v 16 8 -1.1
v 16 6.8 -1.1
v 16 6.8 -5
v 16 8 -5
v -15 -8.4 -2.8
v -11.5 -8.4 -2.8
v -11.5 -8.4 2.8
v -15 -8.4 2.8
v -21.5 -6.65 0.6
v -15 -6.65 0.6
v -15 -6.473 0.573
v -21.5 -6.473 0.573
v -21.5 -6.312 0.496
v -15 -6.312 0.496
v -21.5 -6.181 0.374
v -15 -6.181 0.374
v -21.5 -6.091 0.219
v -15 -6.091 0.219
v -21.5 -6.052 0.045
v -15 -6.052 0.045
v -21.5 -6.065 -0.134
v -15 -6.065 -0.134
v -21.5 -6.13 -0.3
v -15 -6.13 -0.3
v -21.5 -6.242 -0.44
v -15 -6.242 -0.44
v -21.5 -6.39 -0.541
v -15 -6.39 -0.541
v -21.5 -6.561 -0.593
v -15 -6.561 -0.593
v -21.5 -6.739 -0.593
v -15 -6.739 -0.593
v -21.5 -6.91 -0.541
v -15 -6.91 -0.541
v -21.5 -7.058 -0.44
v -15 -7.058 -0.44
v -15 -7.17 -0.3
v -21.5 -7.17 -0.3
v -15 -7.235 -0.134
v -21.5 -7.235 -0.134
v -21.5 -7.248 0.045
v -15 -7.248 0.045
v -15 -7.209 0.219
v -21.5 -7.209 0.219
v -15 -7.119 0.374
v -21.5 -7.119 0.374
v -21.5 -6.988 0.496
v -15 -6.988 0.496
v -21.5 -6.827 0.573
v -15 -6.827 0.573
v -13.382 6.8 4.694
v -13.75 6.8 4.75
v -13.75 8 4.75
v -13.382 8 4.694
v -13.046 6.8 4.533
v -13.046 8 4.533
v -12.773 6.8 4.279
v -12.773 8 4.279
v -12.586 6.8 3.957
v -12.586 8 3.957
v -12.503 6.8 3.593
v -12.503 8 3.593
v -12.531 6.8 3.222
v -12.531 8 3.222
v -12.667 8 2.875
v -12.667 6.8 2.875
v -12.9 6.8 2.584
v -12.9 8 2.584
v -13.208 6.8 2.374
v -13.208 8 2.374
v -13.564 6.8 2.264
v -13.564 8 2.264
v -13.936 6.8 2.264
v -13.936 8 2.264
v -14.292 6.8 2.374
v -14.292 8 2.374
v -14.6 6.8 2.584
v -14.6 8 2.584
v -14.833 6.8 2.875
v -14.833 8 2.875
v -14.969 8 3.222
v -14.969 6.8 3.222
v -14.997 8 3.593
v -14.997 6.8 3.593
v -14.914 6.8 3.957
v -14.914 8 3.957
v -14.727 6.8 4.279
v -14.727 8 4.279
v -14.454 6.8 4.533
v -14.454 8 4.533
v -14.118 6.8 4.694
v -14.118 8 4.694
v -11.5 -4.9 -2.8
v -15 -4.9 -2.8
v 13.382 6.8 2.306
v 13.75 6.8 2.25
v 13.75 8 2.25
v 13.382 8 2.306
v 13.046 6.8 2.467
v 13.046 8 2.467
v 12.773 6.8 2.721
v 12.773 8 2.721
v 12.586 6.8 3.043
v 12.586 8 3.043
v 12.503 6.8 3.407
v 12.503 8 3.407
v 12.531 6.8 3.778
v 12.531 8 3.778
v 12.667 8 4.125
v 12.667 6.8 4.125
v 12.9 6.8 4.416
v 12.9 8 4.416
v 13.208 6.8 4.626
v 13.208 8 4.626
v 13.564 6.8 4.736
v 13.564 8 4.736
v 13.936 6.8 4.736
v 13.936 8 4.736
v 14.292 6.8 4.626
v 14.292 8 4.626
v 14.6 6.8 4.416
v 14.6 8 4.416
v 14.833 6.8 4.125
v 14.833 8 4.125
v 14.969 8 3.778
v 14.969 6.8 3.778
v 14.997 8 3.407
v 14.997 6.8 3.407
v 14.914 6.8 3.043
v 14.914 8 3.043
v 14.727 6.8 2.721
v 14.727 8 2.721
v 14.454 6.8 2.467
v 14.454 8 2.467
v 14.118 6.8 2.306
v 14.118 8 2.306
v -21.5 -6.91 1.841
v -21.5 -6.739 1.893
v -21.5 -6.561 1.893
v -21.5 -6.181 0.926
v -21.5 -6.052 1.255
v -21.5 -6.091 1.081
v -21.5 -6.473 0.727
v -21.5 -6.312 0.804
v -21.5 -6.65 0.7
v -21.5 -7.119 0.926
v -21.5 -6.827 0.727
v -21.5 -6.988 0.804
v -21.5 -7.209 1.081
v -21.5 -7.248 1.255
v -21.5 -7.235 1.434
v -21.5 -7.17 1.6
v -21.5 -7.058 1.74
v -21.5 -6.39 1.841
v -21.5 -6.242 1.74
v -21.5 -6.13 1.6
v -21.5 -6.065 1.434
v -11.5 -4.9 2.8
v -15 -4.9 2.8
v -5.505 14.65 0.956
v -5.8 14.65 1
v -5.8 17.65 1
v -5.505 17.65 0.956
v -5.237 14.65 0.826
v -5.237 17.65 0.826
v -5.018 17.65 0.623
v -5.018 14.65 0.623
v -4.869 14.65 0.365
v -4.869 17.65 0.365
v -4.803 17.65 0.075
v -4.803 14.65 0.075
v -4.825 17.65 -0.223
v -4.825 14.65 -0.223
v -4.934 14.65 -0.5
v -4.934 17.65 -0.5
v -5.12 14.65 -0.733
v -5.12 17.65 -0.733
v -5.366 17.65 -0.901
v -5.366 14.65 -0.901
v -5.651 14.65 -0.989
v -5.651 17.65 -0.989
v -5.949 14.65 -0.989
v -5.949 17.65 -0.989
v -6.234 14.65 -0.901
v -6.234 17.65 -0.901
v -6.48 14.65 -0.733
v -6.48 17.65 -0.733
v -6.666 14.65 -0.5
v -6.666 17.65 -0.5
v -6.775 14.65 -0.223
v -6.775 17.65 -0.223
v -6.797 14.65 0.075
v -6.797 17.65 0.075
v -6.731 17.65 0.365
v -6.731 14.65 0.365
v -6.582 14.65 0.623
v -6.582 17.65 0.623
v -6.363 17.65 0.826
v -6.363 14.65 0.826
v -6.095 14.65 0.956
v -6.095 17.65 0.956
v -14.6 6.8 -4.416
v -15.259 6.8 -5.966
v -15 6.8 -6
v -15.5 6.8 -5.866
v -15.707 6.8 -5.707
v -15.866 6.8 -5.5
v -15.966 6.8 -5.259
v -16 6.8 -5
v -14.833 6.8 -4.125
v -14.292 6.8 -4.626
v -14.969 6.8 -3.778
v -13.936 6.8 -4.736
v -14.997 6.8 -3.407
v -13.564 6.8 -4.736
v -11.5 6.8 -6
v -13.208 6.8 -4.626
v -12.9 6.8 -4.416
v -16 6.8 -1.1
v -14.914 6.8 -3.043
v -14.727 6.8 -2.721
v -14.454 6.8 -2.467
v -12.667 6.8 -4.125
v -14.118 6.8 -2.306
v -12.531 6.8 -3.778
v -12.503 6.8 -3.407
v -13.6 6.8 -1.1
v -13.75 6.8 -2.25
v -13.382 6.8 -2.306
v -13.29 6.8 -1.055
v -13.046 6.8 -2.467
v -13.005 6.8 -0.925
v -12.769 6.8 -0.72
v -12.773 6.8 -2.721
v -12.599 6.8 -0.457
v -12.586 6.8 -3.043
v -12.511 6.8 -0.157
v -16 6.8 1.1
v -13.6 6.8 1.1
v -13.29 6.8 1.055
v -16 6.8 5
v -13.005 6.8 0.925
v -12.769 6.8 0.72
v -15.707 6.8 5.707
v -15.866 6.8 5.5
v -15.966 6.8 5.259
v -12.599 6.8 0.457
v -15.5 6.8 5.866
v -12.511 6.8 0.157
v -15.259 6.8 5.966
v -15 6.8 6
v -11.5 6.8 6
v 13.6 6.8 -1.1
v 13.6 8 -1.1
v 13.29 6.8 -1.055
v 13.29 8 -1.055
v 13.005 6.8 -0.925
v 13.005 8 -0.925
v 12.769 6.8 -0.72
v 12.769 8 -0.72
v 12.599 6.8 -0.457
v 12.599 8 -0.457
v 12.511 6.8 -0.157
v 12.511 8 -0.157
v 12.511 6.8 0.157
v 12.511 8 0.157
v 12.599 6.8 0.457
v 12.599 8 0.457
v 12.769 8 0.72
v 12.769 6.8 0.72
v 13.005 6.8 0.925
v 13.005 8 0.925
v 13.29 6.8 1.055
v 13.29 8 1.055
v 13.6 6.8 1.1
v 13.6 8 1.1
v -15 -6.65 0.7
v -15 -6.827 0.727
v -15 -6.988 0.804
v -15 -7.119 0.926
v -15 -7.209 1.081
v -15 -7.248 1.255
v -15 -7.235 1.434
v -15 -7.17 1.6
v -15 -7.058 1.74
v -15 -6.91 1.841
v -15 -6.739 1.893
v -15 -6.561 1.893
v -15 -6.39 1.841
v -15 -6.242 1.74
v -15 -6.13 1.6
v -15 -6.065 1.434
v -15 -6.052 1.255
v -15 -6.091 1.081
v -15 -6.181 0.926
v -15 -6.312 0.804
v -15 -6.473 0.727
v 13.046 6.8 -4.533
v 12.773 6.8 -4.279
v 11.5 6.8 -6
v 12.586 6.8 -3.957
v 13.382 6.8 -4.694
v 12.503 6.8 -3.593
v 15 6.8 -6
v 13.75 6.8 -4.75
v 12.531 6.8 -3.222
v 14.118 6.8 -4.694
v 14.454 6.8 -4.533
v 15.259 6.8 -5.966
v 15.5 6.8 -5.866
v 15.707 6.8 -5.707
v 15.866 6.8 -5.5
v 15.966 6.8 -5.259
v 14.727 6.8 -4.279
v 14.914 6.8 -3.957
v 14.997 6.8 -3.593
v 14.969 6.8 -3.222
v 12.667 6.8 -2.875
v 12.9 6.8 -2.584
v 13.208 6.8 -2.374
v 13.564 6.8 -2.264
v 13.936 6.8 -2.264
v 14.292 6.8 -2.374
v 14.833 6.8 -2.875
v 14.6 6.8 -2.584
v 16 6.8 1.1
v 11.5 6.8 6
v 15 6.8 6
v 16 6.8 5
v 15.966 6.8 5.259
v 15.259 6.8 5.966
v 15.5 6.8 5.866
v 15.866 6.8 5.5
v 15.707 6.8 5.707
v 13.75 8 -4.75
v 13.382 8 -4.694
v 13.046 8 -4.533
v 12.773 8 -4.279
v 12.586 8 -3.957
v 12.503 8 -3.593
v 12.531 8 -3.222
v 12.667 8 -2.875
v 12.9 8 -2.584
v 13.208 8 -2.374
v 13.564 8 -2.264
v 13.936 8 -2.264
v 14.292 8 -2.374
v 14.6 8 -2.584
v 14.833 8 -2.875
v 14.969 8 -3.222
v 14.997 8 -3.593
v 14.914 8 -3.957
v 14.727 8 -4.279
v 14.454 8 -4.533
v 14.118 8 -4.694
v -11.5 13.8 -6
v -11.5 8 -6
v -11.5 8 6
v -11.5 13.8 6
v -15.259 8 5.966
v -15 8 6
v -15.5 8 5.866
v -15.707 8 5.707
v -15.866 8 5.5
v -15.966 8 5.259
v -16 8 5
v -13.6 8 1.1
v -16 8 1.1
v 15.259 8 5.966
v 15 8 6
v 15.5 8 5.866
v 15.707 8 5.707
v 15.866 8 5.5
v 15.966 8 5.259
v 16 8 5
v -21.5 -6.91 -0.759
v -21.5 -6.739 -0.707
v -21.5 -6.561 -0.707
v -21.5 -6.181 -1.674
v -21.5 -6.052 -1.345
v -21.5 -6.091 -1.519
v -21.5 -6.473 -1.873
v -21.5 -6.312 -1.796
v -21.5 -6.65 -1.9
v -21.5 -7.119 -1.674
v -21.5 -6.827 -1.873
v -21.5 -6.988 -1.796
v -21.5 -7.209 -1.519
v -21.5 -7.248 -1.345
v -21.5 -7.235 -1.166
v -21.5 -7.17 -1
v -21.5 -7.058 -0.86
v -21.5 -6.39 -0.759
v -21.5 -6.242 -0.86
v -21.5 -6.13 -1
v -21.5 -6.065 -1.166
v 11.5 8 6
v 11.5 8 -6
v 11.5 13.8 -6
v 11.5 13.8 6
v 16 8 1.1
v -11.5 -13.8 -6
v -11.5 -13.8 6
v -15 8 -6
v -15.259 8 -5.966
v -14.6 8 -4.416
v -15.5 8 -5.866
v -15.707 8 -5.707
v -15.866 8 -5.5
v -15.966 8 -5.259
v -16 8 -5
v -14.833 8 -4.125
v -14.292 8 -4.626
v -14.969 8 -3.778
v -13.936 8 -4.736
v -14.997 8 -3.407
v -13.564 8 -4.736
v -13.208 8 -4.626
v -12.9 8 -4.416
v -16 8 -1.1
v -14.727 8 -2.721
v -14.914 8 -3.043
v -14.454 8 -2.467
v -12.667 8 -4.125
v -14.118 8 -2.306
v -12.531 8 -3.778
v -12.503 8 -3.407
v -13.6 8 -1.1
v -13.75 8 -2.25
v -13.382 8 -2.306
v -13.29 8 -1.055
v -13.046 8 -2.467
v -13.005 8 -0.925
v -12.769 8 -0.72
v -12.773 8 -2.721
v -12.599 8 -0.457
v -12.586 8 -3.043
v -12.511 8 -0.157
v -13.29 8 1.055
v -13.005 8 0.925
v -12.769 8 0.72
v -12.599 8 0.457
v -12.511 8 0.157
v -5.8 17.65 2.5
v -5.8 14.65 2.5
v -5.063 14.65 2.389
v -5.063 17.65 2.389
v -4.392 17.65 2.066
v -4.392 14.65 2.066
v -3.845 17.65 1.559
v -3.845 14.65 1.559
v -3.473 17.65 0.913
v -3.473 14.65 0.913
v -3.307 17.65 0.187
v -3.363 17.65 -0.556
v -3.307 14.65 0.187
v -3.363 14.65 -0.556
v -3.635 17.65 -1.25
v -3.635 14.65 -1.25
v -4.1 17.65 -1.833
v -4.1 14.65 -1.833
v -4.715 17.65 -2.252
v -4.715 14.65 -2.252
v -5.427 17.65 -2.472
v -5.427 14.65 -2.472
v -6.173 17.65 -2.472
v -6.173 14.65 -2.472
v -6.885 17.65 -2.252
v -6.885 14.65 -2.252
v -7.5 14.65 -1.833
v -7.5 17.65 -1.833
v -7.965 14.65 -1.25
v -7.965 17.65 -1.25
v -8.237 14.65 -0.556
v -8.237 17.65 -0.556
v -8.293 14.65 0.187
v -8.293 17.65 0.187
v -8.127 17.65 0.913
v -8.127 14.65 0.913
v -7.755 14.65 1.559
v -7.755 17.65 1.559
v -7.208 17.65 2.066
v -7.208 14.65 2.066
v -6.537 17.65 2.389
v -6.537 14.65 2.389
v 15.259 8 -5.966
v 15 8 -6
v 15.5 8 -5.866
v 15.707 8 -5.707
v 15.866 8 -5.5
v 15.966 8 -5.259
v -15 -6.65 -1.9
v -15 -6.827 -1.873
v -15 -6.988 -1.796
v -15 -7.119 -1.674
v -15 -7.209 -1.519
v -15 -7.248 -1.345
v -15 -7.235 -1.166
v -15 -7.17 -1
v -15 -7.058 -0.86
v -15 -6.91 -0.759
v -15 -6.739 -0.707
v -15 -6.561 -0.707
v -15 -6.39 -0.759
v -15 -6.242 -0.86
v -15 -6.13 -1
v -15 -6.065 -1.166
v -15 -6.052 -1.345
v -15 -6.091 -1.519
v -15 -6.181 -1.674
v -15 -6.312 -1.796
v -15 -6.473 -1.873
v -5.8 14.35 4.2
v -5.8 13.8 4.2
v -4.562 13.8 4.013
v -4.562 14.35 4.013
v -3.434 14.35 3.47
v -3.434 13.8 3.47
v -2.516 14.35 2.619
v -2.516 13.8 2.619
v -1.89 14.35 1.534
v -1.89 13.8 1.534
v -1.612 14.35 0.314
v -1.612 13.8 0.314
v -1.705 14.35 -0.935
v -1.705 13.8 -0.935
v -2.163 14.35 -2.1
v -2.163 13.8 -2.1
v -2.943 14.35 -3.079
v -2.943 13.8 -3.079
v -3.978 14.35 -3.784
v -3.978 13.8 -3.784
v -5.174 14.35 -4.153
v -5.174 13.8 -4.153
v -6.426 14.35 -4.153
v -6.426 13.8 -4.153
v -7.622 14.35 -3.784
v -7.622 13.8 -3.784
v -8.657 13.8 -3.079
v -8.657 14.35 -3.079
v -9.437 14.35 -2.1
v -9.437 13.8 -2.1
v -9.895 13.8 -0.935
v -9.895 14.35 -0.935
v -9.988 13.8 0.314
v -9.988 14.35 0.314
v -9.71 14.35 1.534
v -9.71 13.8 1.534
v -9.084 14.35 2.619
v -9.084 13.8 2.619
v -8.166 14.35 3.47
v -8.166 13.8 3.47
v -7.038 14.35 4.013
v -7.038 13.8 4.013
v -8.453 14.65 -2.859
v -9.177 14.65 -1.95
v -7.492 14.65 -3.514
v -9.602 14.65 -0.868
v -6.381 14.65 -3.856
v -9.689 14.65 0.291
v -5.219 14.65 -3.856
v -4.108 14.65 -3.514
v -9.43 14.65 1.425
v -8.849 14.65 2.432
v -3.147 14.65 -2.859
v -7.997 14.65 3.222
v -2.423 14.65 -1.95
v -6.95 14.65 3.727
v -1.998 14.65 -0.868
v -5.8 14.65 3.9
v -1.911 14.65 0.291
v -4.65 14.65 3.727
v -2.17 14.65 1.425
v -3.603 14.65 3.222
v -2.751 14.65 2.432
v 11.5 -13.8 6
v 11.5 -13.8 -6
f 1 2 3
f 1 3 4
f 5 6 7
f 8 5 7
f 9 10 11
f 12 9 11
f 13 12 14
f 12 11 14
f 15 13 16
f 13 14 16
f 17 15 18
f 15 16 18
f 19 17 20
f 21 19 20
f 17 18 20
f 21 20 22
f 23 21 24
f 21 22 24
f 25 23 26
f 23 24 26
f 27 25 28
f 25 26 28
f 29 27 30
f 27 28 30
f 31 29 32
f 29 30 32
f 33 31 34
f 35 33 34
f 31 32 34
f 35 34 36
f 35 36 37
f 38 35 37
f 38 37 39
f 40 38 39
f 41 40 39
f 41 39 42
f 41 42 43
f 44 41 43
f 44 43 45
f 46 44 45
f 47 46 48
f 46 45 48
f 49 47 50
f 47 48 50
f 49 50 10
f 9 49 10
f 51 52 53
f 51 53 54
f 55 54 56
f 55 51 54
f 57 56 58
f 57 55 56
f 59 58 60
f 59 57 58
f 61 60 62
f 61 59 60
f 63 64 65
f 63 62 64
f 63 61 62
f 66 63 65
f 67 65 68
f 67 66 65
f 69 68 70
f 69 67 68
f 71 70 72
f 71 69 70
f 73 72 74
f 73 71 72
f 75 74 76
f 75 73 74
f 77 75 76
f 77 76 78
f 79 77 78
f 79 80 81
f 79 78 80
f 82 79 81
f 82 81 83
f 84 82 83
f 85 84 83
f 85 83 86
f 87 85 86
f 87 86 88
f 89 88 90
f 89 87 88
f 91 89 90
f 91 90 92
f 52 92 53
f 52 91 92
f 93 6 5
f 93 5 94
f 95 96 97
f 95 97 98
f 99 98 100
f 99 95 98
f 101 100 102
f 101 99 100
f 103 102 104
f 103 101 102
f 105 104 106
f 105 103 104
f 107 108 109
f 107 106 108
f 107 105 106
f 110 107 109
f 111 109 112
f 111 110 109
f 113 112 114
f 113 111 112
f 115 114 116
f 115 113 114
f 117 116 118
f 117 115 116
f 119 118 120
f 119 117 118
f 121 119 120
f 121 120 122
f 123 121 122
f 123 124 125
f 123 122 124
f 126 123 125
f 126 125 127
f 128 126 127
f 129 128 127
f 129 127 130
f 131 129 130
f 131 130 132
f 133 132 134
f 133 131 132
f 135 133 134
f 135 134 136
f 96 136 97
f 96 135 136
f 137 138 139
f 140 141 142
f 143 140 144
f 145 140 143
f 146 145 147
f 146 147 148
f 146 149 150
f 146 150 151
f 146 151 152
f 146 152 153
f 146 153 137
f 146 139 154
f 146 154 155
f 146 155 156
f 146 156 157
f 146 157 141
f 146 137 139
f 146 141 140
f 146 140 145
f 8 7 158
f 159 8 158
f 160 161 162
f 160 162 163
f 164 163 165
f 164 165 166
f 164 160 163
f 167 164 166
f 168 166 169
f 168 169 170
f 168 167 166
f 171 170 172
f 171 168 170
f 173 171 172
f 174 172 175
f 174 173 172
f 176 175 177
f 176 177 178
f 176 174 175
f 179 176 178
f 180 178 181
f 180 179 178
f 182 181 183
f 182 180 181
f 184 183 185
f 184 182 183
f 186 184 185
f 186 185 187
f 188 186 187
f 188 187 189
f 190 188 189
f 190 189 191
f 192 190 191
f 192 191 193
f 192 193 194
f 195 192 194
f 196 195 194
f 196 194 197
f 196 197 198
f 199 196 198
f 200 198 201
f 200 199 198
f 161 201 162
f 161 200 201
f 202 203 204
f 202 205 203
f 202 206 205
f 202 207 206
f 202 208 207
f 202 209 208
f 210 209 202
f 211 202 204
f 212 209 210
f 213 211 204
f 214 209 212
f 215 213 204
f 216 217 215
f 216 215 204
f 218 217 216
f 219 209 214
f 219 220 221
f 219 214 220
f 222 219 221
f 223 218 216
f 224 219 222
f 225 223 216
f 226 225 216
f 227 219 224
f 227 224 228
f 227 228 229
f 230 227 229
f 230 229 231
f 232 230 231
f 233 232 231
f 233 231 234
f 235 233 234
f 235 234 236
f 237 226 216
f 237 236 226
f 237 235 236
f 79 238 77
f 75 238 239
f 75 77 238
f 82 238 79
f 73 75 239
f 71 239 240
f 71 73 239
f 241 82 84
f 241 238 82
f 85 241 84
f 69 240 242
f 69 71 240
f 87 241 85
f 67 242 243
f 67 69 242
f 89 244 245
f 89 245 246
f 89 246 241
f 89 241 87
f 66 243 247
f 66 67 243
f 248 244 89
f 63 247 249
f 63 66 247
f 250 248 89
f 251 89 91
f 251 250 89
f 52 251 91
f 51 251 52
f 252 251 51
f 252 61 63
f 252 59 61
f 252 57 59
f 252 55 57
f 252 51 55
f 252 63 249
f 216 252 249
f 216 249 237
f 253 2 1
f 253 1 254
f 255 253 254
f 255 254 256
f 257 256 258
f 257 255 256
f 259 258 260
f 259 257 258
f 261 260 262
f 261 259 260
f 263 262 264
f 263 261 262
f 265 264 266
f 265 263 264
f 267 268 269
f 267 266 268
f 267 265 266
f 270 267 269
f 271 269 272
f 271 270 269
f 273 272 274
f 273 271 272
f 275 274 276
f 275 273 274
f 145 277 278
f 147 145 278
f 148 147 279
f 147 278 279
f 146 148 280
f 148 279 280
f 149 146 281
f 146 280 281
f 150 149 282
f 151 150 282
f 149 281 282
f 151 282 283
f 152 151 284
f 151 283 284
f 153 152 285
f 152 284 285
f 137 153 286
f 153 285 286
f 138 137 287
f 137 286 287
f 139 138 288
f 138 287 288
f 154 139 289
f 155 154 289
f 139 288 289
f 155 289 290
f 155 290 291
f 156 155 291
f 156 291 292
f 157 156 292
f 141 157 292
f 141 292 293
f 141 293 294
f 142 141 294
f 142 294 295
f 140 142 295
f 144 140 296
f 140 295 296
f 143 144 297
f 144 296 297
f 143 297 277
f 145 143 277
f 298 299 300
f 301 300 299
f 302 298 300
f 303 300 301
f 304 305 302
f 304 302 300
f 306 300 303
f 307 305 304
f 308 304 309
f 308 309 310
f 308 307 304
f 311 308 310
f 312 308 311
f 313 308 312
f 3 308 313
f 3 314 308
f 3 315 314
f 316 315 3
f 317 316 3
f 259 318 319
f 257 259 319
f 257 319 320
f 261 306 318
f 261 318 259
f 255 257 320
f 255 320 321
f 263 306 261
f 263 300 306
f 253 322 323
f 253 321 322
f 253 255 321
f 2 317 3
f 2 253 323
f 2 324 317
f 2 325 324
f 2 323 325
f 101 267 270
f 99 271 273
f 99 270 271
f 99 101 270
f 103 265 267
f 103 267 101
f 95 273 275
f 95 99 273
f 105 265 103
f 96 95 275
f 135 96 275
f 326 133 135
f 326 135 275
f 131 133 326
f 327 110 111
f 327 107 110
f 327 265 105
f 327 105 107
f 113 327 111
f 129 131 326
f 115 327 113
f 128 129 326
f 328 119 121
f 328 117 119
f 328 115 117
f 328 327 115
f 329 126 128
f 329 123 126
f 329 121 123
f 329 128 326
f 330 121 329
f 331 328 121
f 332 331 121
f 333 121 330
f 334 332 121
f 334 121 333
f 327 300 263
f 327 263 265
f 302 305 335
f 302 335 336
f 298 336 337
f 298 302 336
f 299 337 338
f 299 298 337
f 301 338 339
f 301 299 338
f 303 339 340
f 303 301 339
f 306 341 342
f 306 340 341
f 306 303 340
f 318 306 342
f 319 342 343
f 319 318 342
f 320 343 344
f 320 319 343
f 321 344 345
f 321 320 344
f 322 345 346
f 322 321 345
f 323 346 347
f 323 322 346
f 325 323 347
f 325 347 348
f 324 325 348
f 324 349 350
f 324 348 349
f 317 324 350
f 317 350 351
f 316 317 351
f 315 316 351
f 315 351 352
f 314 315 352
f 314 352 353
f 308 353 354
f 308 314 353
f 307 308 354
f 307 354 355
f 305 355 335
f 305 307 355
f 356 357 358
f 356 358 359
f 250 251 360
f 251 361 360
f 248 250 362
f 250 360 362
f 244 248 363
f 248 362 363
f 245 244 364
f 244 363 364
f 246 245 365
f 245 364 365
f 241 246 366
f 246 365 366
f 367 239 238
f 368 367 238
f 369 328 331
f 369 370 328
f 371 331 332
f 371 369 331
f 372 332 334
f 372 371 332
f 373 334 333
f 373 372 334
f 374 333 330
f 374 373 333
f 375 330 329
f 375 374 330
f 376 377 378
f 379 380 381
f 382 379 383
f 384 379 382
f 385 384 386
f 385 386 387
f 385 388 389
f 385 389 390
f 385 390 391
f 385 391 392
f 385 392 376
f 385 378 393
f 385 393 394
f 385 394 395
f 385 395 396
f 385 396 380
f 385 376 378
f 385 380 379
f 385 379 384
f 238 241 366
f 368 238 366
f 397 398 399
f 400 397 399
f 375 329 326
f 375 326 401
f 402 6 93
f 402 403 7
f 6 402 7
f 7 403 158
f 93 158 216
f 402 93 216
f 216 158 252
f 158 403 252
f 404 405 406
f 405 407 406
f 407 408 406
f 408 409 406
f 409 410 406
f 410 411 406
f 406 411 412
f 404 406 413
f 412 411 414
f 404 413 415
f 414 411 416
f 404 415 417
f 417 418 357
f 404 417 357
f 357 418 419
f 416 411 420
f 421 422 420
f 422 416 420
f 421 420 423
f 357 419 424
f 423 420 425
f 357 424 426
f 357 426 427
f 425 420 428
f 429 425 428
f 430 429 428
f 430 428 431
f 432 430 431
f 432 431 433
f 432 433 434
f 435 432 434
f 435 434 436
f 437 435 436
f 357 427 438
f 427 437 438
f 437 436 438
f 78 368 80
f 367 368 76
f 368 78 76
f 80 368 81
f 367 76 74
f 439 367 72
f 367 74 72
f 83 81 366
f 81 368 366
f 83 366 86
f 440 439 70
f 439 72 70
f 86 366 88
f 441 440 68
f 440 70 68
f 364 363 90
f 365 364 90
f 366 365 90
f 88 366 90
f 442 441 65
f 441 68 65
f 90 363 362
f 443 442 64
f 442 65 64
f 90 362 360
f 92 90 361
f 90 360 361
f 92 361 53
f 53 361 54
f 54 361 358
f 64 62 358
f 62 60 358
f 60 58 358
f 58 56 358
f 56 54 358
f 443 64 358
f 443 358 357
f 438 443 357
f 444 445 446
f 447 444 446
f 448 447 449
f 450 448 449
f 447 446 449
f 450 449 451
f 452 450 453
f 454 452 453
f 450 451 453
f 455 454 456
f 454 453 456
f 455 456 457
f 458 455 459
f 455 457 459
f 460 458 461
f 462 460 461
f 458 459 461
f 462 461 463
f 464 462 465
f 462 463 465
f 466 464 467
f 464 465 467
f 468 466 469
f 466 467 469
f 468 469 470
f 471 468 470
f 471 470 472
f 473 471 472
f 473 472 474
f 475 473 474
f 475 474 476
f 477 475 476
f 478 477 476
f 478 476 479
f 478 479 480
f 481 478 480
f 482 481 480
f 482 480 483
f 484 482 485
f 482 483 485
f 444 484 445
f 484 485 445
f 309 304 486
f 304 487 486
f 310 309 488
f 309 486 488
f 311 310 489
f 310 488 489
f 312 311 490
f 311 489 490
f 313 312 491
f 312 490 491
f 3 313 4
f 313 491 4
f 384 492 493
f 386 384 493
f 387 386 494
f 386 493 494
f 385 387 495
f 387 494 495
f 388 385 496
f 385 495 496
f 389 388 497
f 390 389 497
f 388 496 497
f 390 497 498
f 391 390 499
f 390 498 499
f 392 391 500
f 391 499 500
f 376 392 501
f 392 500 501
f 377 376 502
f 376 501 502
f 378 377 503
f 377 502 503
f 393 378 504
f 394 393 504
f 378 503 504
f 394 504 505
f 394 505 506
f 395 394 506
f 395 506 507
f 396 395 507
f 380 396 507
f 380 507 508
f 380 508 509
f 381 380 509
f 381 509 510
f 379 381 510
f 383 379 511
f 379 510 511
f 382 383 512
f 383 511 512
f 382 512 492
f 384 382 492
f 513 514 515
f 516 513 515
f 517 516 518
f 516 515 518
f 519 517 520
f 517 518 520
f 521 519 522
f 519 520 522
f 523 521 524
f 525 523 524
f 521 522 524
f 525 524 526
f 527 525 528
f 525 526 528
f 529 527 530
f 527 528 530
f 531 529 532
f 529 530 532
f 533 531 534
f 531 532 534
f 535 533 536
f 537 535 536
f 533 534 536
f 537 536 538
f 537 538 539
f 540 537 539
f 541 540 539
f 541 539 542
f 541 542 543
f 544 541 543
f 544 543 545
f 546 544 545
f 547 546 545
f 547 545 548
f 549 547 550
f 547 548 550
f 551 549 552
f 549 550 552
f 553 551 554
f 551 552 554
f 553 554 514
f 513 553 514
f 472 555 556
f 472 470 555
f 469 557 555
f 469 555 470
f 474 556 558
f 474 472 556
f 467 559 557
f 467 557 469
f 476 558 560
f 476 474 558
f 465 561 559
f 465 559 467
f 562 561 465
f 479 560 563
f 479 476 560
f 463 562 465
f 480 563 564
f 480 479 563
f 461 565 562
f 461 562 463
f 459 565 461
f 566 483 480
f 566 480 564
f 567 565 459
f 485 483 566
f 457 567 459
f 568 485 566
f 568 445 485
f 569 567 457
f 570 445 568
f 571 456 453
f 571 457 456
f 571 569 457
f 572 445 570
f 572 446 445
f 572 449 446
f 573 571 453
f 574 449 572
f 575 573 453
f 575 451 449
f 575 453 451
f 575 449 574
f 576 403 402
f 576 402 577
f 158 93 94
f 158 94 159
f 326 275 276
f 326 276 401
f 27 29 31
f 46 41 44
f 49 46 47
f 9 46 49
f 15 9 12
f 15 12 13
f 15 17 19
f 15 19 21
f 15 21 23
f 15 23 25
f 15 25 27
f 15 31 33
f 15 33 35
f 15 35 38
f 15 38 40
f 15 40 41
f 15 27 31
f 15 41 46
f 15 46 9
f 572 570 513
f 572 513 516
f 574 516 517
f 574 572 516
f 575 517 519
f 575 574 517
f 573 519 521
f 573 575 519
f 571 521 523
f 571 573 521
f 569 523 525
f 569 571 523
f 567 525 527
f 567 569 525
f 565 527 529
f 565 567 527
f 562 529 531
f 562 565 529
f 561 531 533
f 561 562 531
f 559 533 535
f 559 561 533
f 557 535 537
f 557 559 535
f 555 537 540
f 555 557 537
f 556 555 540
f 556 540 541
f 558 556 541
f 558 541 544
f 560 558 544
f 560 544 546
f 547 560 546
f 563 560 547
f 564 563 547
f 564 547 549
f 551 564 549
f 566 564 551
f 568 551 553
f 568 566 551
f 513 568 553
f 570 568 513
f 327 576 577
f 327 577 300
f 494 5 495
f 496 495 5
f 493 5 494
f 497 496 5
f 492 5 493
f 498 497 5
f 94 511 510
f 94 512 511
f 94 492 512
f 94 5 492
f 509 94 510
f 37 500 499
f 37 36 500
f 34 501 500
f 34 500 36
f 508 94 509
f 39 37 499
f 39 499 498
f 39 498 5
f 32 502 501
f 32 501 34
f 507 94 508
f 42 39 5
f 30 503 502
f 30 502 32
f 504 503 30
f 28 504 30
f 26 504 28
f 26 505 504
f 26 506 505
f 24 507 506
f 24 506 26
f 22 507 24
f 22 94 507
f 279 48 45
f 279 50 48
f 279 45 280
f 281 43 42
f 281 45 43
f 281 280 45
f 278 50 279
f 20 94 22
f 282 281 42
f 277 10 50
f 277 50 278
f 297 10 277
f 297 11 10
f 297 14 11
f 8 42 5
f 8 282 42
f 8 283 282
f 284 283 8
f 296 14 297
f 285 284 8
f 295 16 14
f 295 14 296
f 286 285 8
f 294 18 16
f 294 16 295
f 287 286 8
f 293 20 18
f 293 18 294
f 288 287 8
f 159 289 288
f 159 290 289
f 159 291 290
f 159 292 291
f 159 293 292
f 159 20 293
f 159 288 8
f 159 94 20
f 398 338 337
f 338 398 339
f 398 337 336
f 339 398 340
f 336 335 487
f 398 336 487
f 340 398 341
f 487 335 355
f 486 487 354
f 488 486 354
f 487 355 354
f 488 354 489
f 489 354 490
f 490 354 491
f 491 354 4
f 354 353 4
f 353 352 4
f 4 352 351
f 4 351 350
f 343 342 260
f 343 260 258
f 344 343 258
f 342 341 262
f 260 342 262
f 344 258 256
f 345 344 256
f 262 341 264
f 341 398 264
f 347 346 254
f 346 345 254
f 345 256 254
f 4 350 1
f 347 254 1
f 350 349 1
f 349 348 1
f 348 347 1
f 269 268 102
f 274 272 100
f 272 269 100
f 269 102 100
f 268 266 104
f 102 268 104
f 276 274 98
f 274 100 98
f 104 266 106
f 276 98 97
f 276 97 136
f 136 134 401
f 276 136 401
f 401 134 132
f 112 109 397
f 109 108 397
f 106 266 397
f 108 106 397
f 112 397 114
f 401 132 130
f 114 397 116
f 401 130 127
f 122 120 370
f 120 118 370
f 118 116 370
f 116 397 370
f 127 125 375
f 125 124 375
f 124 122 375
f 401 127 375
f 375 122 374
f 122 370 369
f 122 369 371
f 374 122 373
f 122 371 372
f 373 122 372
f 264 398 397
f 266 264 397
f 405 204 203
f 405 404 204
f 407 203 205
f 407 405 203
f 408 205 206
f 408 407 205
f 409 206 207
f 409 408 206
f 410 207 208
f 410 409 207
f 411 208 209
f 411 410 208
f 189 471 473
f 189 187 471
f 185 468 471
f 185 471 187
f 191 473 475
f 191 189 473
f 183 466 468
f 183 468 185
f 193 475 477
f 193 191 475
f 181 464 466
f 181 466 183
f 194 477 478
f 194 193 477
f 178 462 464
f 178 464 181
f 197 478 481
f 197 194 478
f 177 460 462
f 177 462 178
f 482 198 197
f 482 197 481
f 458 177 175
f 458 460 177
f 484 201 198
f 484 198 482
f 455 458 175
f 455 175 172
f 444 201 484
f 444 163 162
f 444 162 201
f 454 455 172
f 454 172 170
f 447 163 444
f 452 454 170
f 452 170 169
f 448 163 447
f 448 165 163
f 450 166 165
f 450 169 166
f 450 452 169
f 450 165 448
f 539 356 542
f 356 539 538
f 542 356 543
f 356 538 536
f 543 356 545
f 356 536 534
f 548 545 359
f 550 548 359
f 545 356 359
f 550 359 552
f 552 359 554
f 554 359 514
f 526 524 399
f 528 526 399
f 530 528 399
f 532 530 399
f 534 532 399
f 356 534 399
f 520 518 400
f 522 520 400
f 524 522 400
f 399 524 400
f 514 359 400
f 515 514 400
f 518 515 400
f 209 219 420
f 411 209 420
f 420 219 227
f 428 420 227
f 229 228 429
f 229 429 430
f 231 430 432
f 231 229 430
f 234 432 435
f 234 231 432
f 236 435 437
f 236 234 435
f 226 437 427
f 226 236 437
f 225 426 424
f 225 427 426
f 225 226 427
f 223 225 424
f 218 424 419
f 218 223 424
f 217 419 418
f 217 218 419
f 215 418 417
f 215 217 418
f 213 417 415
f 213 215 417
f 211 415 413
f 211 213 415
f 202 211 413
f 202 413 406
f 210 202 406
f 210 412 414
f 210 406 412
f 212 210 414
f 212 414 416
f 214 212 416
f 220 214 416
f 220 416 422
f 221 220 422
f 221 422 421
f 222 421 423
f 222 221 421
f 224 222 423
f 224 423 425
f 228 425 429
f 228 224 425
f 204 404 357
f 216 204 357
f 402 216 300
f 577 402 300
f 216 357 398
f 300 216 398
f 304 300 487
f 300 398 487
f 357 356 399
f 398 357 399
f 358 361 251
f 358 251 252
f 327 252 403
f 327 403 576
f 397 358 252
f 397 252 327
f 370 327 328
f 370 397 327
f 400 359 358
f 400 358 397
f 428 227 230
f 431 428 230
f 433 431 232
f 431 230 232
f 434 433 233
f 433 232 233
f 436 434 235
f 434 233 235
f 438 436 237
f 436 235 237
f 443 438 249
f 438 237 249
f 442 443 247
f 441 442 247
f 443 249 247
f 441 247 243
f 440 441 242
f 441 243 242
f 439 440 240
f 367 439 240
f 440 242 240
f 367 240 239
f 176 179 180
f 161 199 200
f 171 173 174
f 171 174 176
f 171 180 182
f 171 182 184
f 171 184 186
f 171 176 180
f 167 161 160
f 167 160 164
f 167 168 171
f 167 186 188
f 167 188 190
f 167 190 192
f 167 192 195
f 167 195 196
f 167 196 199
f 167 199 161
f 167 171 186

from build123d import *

# Parameters (mm, degrees)
SKETCH_1_W               = 23
SKETCH_1_H               = 27.6
SKETCH_1_W_2             = 4.5
SKETCH_1_H_2             = 1.2
EXTRUDE_1_DEPTH          = 6
SKETCH_2_R               = 4.2
EXTRUDE_2_DEPTH          = 0.85
CHAMFER_1_SIZE           = 0.3
SKETCH_4_R               = 2.5
SKETCH_4_R_2             = 1
EXTRUDE_3_DEPTH          = 3
CUT_EXTRUDE_1_DEPTH      = 28.699097458
CUT_EXTRUDE_1_DEPTH_BACK = 28.699097458
SKETCH_3_R               = 1.25
FILLET_1_R               = 1
SKETCH_5_W               = 5.6
SKETCH_5_H               = 3.5
EXTRUDE_4_DEPTH          = 3.5
SKETCH_6_R               = 0.6
EXTRUDE_7_DEPTH          = 6.5


with BuildPart() as part:
    # Эскиз1 → Бобышка-Вытянуть1 (new, symmetric)
    with BuildSketch(Plane.XY):
        Rectangle(SKETCH_1_W, SKETCH_1_H)
        with Locations((-13.75, 7.4)):
            Rectangle(SKETCH_1_W_2, SKETCH_1_H_2)
        with Locations((13.75, 7.4)):
            Rectangle(SKETCH_1_W_2, SKETCH_1_H_2)
    extrude(amount=EXTRUDE_1_DEPTH, both=True)

    # Эскиз2 → Бобышка-Вытянуть2 (add)
    with BuildSketch(Plane(origin=(0, 13.8, 0), x_dir=(1, 0, 0), z_dir=(0, 1, 0))):
        with Locations(Location((-5.8, 0, 0), (0, 0, 270))):
            Circle(SKETCH_2_R)
    extrude(amount=EXTRUDE_2_DEPTH)

    # Фаска1
    chamfer_1_edges = [part.edges().sort_by_distance(p)[0] for p in [
        (-5.8, 14.65, -4.2),
    ]]
    chamfer(chamfer_1_edges, length=CHAMFER_1_SIZE)

    # Эскиз4 → Бобышка-Вытянуть3 (add)
    with BuildSketch(Plane(origin=(0, 14.65, 0), x_dir=(1, 0, 0), z_dir=(0, 1, 0))):
        with Locations(Location((-5.8, 0, 0), (0, 0, 270))):
            Circle(SKETCH_4_R)
        with Locations(Location((-5.8, 0, 0), (0, 0, 270))):
            Circle(SKETCH_4_R_2, mode=Mode.SUBTRACT)
    extrude(amount=EXTRUDE_3_DEPTH)

    # Эскиз3 → Вырез-Вытянуть1 (cut, two sides: drawn at the far end of the back side and taken through both)
    with BuildSketch(Plane(origin=(0, 8, 0), x_dir=(1, 0, 0), z_dir=(0, 1, 0)).offset(-CUT_EXTRUDE_1_DEPTH_BACK)):
        with Locations(Location((-13.75, 3.5, 0), (0, 0, 270))):
            Circle(SKETCH_3_R)
        with Locations(Location((-13.75, -3.5, 0), (0, 0, 270))):
            Circle(SKETCH_3_R)
        with Locations(Location((13.75, -3.5, 0), (0, 0, 90))):
            Circle(SKETCH_3_R)
        with Locations(Location((13.75, 3.5, 0), (0, 0, 90))):
            Circle(SKETCH_3_R)
        with BuildLine():
            Line((-16, 1.1), (-13.6, 1.1))
            ThreePointArc((-13.6, 1.1), (-12.5, 0), (-13.6, -1.1))
            Line((-13.6, -1.1), (-16, -1.1))
            Line((-16, -1.1), (-16, 1.1))
        make_face()
        with BuildLine():
            Line((16, 1.1), (13.6, 1.1))
            ThreePointArc((13.6, 1.1), (12.5, 0), (13.6, -1.1))
            Line((13.6, -1.1), (16, -1.1))
            Line((16, -1.1), (16, 1.1))
        make_face()
    extrude(amount=CUT_EXTRUDE_1_DEPTH + CUT_EXTRUDE_1_DEPTH_BACK, mode=Mode.SUBTRACT)

    # Скругление1
    fillet_1_edges = [part.edges().sort_by_distance(p)[0] for p in [
        (-16, 7.4, -6),
        (16, 7.4, -6),
        (16, 7.4, 6),
        (-16, 7.4, 6),
    ]]
    fillet(fillet_1_edges, radius=FILLET_1_R)

    # Эскиз5 → Бобышка-Вытянуть4 (add)
    with BuildSketch(Plane.ZY.offset(11.5)):
        with Locations((0, -6.65)):
            Rectangle(SKETCH_5_W, SKETCH_5_H)
    extrude(amount=EXTRUDE_4_DEPTH)

    # Эскиз6 → Бобышка-Вытянуть7 (add)
    with BuildSketch(Plane.ZY.offset(15)):
        with Locations((0, -6.65)):
            Circle(SKETCH_6_R)
        with Locations(Location((1.3, -6.65, 0), (0, 0, 180))):
            Circle(SKETCH_6_R)
        with Locations(Location((-1.3, -6.65, 0), (0, 0, 180))):
            Circle(SKETCH_6_R)
    extrude(amount=EXTRUDE_7_DEPTH)


solid = part.part
